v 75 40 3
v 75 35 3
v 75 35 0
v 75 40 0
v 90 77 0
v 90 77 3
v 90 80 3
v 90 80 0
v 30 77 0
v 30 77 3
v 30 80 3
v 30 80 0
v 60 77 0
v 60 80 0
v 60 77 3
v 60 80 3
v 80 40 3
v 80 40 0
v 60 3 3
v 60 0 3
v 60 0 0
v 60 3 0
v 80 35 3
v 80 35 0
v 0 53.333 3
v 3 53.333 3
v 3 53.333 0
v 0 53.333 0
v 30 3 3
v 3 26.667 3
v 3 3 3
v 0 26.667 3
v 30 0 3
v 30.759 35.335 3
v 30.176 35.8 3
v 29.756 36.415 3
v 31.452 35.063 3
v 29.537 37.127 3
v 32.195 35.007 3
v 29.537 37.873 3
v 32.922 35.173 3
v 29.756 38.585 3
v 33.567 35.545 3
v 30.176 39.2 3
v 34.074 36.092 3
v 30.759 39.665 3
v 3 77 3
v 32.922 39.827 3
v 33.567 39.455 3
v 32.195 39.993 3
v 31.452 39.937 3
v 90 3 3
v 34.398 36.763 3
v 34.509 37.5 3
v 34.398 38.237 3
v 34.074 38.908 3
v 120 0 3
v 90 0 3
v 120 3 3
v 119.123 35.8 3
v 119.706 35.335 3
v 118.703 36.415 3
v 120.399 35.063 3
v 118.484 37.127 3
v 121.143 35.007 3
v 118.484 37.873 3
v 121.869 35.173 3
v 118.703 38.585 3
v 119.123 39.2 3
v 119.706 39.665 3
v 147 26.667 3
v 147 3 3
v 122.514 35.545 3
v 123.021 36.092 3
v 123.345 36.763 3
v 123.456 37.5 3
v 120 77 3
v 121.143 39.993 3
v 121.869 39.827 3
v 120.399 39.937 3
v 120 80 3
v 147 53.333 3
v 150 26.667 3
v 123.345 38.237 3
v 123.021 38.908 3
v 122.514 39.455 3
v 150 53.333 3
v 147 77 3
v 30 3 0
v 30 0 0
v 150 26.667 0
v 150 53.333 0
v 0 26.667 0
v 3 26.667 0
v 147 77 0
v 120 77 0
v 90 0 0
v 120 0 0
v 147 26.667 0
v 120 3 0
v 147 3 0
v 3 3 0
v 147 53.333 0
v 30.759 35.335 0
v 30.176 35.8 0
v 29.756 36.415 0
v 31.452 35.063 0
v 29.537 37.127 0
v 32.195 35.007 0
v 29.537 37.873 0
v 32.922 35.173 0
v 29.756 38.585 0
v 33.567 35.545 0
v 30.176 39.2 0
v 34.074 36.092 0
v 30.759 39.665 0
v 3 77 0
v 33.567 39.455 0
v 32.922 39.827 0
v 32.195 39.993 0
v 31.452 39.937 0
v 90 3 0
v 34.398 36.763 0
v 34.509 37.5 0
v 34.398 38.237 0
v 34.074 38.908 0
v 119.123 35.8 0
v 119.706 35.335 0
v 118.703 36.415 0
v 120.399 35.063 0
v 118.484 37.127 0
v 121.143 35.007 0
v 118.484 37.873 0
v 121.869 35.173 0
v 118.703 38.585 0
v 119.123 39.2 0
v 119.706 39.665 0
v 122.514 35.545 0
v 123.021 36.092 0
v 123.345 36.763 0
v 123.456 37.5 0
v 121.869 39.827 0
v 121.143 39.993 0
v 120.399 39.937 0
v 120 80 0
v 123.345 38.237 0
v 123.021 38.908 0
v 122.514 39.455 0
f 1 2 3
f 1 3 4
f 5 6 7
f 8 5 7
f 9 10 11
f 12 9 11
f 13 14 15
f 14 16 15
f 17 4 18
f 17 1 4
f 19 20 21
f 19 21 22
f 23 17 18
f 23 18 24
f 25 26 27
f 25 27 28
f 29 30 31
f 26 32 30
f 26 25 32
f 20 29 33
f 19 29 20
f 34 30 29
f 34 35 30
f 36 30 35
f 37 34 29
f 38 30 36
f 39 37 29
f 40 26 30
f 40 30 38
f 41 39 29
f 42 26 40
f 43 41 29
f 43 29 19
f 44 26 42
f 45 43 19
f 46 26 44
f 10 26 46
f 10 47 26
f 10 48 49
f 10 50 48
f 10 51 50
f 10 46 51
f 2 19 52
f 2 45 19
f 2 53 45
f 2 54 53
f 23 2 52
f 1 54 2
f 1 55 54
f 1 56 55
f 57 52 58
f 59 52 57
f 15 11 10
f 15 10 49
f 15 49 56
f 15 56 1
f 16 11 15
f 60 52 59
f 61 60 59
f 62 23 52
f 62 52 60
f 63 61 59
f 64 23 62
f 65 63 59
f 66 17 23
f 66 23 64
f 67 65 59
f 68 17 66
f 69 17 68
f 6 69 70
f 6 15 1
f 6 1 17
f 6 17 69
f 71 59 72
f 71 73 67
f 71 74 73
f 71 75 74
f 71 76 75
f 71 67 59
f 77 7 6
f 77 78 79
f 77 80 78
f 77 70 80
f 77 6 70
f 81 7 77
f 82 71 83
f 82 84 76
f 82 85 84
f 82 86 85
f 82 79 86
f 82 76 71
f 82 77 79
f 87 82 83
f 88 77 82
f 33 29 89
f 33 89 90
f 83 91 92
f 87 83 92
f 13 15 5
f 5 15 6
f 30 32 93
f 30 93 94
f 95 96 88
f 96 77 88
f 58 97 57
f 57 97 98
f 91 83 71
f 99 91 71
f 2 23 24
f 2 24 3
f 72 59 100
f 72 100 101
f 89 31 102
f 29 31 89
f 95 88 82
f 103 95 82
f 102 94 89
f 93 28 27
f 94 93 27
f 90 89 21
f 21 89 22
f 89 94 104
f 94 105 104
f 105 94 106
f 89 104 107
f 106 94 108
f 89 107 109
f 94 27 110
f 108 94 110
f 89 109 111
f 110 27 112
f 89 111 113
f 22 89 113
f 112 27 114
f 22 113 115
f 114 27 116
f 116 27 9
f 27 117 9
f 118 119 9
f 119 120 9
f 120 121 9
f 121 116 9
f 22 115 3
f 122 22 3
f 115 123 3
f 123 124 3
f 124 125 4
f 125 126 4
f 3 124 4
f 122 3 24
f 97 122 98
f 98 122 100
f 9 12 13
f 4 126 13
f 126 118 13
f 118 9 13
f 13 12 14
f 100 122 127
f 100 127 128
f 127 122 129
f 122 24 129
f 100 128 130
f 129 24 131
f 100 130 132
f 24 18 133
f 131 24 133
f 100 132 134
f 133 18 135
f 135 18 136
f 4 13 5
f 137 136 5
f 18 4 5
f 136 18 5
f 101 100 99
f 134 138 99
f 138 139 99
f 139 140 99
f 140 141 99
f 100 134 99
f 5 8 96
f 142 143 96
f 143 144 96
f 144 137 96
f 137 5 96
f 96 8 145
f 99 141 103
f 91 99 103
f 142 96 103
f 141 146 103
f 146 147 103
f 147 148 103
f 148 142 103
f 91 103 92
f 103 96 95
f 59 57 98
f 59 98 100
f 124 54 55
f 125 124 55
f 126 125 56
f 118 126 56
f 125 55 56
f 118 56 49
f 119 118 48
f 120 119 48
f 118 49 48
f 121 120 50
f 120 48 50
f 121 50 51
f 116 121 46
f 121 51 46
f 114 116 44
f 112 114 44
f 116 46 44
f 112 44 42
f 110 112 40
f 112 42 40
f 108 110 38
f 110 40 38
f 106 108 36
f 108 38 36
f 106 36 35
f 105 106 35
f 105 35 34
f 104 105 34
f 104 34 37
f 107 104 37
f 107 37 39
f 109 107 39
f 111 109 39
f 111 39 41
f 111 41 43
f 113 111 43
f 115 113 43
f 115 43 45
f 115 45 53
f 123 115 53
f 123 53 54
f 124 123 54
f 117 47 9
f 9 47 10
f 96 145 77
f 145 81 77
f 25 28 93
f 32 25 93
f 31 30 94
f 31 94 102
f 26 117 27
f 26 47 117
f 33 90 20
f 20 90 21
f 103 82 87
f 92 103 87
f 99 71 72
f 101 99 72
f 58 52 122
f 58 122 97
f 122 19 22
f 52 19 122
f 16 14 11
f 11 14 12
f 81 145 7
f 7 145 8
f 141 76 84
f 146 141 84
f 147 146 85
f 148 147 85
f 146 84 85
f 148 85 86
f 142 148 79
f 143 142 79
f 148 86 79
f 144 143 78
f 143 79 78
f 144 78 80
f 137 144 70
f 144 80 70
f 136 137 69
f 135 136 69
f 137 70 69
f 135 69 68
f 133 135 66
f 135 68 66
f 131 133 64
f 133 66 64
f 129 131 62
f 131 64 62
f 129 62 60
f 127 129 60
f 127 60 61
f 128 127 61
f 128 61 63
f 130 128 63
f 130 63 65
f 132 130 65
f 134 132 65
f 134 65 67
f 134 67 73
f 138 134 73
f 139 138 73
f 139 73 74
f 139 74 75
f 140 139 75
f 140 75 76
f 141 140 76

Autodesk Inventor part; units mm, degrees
ref_plane "YZ Plane" through (0, 0, 0) normal (1, 0, 0) x (0, 1, 0)
ref_plane "XZ Plane" through (0, 0, 0) normal (0, 1, 0) x (-1, 0, 0)
ref_plane "XY Plane" through (0, 0, 0) normal (0, 0, 1) x (1, 0, 0)
sketch "Sketch1" plane through (0, 0, 0) normal (0, 0, 1) x (1, 0, 0)
  line L0 (0, 0) -> (150, 0)
  line L1 (150, 0) -> (150, 80)
  line L2 (150, 80) -> (0, 80)
  line L3 (0, 80) -> (0, 0)
  dimension "d0" = 150
  dimension "d1" = 80
extrude "Extrusion1" add sketch "Sketch1" along normal blind 3
sketch "Sketch2" plane through (0, 0, 3) normal (0, 0, 1) x (1, 0, 0)
  line L0 (0, 80) -> (0, 0)
  line L1 (150, 0) -> (150, 80)
  line L2 (3, 80) -> (3, 53.3333)
  line L3 (3, 53.3333) -> (0, 53.3333)
  line L4 (0, 53.3333) -> (0, 26.6667)
  line L5 (0, 26.6667) -> (3, 26.6667)
  line L6 (3, 26.6667) -> (3, 0)
  line L7 (0, 80) -> (0, 53.3333)
  line L8 (0, 26.6667) -> (0, 0)
  line L9 (147, 80) -> (147, 53.3333)
  line L10 (147, 53.3333) -> (150, 53.3333)
  line L11 (150, 53.3333) -> (150, 26.6667)
  line L12 (150, 26.6667) -> (147, 26.6667)
  line L13 (147, 26.6667) -> (147, 0)
  line L14 (150, 0) -> (150, 26.6667)
  line L15 (150, 53.3333) -> (150, 80)
  line L16 (0, 26.6667) -> (0, 0)
  line L17 (0, 0) -> (0, 3)
  line L18 (0, 3) -> (30, 3)
  line L19 (30, 3) -> (30, 0)
  line L20 (30, 0) -> (60, 0)
  line L21 (0, 0) -> (150, 0)
  line L22 (60, 0) -> (60, 3)
  line L23 (60, 3) -> (90, 3)
  line L24 (90, 3) -> (90, 0)
  line L25 (90, 0) -> (120, 0)
  line L26 (120, 0) -> (120, 3)
  line L27 (120, 3) -> (150, 3)
  line L28 (0, 80) -> (0, 77)
  line L29 (0, 77) -> (30, 77)
  line L30 (30, 77) -> (30, 80)
  line L31 (60, 80) -> (60, 77)
  line L32 (30, 80) -> (60, 80)
  line L33 (0, 80) -> (150, 80)
  line L34 (60, 77) -> (90, 77)
  line L35 (90, 77) -> (90, 80)
  line L36 (120, 80) -> (120, 77)
  line L37 (120, 77) -> (150, 77)
  line L38 (90, 80) -> (120, 80)
  line L39 (0, 0) -> (30, 0)
  line L40 (0, 0) -> (150, 0) projected
  line L41 (120, 0) -> (150, 0)
  line L42 (150, 0) -> (150, 80) projected
  line L43 (150, 80) -> (120, 80)
  line L44 (150, 80) -> (0, 80) projected
  line L45 (30, 80) -> (0, 80)
  dimension "d4" = 3
  dimension "d5" = 26.6667
  dimension "d6" = 26.6667
  dimension "d7" = 3
  dimension "d8" = 26.6667
  dimension "d9" = 26.6667
  dimension "d10" = 3
  dimension "d11" = 30
  dimension "d12" = 30
  dimension "d13" = 30
  dimension "d14" = 30
extrude "Extrusion2" cut sketch "Sketch2" against normal blind 3 contours L33 L2 L29 L0 | L29 L2 L3 L0 | L33 L30 L29 L2 | L5 L6 L18 L0 | L33 L35 L34 L31 | L18 L6 L21 L0 | L18 L19 L21 L6 | L33 L9 L37 L36 | L33 L1 L37 L9 | L37 L1 L10 L9 | L22 L23 L24 L21 | L26 L27 L13 L21 | L1 L27 L13 L12 | L13 L27 L1 L21
sketch "Sketch3" plane through (0, 0, 3) normal (0, 0, 1) x (1, 0, 0)
  line L0 (60, 77) -> (90, 77) projected
  line L1 (90, 3) -> (60, 3) projected
  line L2 (0, 53.3333) -> (0, 26.6667) projected
  line L3 (150, 26.6667) -> (150, 53.3333) projected
  line L4 (80, 40) -> (80, 35)
  line L5 (80, 35) -> (75, 35)
  line L6 (75, 35) -> (75, 40)
  line L7 (75, 40) -> (80, 40)
  circle A0 centre (32.0086, 37.5) radius 2.5
  circle A1 centre (120.9557, 37.5) radius 2.5
  point P0 (0, 0)
  dimension "d22" = 5
  dimension "d23" = 5
  dimension "d24" = 5
  dimension "d25" = 5
extrude "Extrusion3" cut sketch "Sketch3" against normal blind 3
properties part number "TAPA4"
